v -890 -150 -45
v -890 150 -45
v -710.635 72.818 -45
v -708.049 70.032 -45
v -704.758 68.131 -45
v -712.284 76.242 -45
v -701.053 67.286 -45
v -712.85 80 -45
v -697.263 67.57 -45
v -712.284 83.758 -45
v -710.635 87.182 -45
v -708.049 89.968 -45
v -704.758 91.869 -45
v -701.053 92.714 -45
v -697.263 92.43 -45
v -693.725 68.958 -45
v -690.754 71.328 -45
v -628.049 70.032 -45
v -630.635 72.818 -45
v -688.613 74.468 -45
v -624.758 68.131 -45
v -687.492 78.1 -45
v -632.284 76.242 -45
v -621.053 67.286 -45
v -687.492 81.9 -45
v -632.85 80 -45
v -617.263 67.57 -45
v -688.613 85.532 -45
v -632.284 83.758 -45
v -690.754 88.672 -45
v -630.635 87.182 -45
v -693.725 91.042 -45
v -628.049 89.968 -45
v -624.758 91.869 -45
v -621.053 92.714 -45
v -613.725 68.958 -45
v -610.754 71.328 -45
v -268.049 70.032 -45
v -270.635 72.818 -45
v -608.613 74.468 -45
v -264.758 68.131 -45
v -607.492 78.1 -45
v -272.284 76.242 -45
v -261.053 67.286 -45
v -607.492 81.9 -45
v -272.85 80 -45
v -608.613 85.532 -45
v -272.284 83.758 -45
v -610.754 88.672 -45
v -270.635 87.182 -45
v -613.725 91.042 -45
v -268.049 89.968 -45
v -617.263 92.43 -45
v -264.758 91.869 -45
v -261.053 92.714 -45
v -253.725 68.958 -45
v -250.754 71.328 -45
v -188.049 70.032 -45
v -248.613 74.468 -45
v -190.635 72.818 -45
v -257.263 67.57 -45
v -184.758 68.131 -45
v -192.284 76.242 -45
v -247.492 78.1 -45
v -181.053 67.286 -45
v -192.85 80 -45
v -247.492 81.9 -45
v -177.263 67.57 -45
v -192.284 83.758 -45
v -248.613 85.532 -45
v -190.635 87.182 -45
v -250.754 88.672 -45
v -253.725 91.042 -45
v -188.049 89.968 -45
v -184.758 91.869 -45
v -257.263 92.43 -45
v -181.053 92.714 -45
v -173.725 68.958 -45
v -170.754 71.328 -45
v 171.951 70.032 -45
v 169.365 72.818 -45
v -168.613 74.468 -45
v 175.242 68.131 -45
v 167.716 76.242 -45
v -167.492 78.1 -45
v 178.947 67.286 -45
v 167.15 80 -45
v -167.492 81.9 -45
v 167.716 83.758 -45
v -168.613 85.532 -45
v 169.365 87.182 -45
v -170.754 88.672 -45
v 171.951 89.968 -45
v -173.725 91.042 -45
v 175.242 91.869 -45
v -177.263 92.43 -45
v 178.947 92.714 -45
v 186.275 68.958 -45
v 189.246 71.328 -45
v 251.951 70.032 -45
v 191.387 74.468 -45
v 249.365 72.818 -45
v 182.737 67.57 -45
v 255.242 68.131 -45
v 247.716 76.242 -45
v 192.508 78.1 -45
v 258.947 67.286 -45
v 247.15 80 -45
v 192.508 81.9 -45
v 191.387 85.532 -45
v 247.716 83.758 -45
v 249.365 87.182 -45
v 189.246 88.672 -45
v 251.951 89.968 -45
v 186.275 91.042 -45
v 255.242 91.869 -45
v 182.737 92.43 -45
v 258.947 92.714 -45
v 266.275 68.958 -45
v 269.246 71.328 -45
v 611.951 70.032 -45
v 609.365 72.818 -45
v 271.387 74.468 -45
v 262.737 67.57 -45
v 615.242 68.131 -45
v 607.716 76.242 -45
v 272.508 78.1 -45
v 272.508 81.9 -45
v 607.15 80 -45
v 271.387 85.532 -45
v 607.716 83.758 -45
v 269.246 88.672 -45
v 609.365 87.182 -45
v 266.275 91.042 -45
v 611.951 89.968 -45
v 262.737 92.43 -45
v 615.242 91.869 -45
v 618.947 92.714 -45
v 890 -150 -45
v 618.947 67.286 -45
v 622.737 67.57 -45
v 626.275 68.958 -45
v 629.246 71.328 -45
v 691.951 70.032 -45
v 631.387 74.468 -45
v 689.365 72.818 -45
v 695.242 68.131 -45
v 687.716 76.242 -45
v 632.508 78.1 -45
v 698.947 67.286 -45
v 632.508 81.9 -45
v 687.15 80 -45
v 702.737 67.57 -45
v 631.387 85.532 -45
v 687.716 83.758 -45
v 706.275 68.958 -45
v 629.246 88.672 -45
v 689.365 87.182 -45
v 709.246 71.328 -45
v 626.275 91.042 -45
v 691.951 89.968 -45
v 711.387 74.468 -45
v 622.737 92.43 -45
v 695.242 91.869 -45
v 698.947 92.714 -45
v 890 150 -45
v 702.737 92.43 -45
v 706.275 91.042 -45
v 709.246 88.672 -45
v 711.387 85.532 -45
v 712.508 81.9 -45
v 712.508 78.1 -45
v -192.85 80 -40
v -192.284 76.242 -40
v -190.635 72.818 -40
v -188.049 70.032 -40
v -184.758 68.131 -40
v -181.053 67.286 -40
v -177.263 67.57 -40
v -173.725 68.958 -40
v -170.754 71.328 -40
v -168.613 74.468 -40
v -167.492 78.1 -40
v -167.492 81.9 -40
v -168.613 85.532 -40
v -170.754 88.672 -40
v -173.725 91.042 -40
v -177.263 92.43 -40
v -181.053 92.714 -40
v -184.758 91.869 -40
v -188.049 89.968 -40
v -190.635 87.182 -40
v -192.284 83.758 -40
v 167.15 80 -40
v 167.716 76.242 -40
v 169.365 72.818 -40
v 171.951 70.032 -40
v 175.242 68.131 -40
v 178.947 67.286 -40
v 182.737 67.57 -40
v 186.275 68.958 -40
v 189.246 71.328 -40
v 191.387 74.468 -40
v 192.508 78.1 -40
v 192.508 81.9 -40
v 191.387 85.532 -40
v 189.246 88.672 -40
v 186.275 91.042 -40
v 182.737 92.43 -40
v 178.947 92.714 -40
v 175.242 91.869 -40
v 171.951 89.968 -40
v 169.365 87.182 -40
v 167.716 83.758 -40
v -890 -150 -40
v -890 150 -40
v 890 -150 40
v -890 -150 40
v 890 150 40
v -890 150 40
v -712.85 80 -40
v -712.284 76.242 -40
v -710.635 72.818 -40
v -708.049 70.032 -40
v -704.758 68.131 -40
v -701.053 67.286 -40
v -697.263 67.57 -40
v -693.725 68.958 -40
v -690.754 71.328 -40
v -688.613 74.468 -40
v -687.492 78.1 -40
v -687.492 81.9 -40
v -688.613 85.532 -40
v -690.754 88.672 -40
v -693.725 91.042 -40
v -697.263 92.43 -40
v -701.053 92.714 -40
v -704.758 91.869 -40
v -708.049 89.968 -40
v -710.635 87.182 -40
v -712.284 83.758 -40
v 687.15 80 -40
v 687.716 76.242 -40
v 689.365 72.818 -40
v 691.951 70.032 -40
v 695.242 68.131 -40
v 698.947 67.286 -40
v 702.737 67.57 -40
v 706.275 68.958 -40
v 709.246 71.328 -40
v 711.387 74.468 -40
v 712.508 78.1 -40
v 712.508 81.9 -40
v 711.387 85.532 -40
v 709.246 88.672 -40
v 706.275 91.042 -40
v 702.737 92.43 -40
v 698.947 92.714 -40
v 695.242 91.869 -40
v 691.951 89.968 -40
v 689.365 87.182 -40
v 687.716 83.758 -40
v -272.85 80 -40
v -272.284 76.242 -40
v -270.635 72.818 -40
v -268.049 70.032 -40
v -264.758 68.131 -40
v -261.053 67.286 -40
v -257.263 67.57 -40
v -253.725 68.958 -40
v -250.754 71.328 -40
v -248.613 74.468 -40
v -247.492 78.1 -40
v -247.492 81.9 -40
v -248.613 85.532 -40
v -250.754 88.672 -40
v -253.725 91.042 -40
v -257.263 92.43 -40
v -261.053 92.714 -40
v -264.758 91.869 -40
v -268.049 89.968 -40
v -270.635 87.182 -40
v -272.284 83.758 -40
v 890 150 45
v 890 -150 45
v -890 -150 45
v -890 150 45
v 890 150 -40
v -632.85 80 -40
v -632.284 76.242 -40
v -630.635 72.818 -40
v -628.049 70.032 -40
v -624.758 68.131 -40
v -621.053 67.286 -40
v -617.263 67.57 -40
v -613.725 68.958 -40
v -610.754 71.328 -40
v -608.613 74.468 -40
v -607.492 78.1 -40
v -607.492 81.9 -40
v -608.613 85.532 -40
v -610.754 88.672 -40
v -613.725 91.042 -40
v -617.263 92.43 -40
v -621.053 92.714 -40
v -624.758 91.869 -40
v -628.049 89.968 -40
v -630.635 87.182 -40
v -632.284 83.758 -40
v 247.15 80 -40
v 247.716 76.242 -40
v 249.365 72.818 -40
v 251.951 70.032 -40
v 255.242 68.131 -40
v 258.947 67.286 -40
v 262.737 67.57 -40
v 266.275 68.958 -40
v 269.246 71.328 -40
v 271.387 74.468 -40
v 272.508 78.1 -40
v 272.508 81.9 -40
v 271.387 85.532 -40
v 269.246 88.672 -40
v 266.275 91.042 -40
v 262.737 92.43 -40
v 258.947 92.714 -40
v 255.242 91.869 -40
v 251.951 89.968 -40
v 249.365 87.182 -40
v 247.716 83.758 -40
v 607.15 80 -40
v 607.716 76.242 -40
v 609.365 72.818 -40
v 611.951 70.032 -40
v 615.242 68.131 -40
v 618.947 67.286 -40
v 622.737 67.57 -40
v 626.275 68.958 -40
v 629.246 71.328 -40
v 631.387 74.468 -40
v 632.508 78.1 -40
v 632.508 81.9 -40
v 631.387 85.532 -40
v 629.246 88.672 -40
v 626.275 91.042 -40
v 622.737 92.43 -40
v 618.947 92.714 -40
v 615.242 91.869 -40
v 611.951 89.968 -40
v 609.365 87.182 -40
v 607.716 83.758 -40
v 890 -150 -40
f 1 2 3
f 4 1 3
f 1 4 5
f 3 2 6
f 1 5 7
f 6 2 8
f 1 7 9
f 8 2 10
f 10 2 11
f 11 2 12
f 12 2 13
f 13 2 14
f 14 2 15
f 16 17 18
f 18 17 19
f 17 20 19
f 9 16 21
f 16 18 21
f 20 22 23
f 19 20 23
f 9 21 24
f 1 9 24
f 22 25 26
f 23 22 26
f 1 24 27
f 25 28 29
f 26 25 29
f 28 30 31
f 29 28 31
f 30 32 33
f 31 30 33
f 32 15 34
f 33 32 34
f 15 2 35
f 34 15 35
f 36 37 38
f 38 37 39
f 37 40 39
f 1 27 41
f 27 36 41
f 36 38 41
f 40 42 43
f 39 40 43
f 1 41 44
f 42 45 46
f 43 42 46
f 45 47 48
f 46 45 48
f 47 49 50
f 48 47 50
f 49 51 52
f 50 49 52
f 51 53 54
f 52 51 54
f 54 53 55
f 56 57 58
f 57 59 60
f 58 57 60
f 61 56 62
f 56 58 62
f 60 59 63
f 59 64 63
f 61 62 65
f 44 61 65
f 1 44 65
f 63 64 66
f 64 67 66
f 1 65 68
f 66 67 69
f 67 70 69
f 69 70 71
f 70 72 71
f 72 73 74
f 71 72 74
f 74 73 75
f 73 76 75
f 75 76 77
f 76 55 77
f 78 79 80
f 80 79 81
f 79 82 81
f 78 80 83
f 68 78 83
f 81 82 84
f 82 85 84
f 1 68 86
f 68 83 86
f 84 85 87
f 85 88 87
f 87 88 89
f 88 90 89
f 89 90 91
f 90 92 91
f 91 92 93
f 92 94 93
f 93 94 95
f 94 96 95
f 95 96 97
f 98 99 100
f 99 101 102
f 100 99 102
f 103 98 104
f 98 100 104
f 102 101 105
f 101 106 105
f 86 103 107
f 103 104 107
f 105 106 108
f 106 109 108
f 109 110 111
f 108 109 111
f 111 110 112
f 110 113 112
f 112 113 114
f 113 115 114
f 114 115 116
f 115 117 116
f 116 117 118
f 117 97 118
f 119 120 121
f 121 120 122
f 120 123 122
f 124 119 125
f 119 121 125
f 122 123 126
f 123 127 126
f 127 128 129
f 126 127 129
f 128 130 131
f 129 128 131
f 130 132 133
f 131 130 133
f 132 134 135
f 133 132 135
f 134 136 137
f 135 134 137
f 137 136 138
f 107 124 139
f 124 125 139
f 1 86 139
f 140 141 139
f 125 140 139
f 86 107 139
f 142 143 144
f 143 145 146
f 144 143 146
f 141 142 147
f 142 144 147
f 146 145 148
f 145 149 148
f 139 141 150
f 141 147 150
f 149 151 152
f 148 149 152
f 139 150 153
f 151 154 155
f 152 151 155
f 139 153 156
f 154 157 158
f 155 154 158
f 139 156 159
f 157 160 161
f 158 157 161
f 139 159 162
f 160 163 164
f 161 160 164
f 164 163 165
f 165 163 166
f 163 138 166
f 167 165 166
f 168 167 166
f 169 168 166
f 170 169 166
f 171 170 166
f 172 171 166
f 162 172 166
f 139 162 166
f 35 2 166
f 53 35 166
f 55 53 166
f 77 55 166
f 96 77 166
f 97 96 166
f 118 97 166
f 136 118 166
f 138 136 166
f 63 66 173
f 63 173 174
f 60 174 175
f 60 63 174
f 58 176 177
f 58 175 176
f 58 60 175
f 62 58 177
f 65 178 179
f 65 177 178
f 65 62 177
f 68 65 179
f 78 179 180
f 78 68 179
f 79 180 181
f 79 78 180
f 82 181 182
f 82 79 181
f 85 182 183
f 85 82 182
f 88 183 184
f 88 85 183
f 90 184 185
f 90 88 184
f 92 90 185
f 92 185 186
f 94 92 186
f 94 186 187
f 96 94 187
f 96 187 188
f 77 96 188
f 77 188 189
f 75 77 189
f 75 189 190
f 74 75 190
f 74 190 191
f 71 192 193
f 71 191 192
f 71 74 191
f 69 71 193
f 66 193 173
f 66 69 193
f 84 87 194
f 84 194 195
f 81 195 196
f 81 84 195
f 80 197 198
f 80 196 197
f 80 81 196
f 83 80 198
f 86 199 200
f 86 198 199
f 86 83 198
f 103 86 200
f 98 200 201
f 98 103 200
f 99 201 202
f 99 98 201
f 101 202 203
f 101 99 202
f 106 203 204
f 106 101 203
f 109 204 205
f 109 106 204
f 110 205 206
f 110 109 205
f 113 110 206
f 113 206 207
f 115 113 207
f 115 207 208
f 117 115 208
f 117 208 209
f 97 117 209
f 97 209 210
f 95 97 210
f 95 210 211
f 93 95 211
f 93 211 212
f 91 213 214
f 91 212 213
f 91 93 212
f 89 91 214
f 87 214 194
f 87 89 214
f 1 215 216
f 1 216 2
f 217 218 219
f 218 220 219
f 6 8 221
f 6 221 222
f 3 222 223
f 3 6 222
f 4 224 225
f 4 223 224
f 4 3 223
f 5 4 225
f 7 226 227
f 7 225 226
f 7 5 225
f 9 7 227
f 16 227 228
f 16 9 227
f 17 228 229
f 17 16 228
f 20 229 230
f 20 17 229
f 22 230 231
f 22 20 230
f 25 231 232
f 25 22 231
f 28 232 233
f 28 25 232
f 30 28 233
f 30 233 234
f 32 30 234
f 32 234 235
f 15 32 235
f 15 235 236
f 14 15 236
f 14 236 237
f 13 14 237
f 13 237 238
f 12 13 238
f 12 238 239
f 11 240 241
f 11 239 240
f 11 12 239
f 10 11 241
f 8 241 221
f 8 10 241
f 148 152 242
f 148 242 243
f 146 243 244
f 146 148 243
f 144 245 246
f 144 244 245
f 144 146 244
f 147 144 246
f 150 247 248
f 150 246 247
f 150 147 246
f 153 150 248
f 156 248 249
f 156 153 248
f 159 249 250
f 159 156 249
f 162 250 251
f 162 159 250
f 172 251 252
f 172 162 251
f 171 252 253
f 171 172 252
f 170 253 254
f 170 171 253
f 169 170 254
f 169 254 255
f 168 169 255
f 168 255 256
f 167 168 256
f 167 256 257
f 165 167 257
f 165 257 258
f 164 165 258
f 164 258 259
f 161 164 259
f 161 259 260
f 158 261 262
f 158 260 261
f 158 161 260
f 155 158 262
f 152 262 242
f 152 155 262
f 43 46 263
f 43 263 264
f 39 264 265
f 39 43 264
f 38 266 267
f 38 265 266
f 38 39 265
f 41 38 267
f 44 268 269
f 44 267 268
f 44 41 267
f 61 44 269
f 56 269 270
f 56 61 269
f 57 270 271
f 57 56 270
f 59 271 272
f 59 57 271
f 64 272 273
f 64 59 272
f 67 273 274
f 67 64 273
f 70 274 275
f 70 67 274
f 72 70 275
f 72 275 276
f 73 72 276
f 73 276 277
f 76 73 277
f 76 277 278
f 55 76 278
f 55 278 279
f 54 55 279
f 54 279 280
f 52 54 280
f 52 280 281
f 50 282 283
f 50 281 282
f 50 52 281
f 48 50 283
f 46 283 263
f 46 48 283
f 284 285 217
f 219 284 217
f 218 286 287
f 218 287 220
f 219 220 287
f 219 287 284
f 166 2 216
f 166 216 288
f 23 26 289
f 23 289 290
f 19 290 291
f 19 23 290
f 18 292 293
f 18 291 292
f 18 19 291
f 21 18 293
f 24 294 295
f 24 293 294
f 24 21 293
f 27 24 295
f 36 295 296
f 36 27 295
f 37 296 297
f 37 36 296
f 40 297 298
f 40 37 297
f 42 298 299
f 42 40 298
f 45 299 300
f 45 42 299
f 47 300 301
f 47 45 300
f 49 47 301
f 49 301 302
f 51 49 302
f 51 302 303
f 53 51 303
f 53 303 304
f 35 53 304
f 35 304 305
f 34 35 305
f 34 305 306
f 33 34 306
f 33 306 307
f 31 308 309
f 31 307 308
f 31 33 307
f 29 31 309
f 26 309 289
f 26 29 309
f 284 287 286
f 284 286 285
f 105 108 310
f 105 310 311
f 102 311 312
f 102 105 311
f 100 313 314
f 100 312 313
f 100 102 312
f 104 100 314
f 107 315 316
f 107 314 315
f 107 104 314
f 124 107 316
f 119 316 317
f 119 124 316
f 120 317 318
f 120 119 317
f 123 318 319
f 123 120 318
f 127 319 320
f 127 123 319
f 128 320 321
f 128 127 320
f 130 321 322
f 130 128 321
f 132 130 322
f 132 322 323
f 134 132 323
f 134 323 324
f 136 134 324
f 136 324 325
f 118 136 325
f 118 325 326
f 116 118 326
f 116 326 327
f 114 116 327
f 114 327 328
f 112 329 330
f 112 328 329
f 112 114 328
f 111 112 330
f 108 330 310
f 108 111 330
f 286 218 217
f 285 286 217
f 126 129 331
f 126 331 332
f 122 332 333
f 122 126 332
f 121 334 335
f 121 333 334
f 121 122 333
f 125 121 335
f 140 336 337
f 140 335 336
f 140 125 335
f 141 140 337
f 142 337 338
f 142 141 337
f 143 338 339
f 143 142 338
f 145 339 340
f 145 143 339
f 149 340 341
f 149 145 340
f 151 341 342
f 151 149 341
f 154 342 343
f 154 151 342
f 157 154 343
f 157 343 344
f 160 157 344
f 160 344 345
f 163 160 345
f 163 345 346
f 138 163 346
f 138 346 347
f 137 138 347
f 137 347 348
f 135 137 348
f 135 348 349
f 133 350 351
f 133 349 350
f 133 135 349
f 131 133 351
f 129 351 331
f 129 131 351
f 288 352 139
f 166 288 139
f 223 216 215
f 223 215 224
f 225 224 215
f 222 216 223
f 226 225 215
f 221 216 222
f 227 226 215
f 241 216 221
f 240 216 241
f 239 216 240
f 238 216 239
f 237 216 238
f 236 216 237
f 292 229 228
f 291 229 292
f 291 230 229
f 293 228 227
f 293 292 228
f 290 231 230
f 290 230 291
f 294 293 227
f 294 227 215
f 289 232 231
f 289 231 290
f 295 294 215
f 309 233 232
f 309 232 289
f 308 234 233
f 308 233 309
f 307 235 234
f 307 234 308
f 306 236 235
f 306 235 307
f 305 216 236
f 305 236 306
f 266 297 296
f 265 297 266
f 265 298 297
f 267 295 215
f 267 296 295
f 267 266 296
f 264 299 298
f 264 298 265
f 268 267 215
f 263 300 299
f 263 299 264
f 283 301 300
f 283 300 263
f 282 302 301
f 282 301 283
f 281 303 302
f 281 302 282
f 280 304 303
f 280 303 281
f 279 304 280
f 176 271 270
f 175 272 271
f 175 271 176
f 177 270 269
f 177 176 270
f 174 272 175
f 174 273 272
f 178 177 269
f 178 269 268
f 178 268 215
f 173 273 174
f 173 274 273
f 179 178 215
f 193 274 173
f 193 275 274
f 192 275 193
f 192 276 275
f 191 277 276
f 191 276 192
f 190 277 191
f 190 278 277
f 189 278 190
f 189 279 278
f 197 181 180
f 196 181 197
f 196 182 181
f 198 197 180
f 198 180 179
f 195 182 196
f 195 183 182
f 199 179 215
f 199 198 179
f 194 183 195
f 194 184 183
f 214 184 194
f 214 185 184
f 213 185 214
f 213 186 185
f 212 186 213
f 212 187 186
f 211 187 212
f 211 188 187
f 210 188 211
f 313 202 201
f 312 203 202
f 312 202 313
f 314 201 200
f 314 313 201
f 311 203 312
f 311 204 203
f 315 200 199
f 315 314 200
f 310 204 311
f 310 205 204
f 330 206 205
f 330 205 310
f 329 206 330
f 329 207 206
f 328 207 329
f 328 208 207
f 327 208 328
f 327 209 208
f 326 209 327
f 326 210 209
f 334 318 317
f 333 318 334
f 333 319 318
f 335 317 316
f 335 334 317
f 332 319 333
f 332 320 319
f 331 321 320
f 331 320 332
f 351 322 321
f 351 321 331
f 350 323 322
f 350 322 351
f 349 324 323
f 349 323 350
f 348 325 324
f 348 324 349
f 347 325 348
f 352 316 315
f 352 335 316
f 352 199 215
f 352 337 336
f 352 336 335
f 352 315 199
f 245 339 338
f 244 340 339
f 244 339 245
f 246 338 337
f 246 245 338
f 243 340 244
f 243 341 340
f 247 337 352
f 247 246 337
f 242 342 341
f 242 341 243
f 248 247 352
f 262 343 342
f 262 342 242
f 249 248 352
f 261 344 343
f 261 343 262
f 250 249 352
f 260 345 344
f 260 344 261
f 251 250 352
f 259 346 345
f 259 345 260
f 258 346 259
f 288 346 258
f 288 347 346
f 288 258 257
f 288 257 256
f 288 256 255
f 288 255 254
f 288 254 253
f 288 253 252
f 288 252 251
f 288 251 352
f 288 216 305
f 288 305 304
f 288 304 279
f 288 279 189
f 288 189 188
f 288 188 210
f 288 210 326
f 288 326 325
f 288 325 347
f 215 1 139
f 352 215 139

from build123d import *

# Parameters (mm, degrees)
SKETCH1_W               = 1780
SKETCH1_H               = 5
BOSS_EXTRUDE1_DEPTH     = 150
BOSS_EXTRUDE1_2_DEPTH   = 150
CUT_EXTRUDE1_DEPTH      = 39
CUT_EXTRUDE1_DEPTH_BACK = 33
CUT_EXTRUDE1_START      = -85
SKETCH2_R               = 12.75


with BuildPart() as part:
    # Sketch1 → Boss-Extrude1 (new, symmetric)
    with BuildSketch(Plane(origin=(0, 0, 0), x_dir=(1, 0, 0), z_dir=(0, 1, 0))):
        with Locations((0, 42.5)):
            Rectangle(SKETCH1_W, SKETCH1_H)
    extrude(amount=BOSS_EXTRUDE1_DEPTH, both=True)

    # Sketch2 → Cut-Extrude1 (cut, two sides: drawn at the far end of the back side and taken through both)
    with BuildSketch(Plane.XY.offset(45).offset(CUT_EXTRUDE1_START - CUT_EXTRUDE1_DEPTH_BACK)):
        with Locations(Location((-700.1, 80, 0), (0, 0, 180))):
            Circle(SKETCH2_R)
        with Locations(Location((-620.1, 80, 0), (0, 0, 180))):
            Circle(SKETCH2_R)
        with Locations(Location((-260.1, 80, 0), (0, 0, 180))):
            Circle(SKETCH2_R)
        with Locations(Location((-180.1, 80, 0), (0, 0, 180))):
            Circle(SKETCH2_R)
        with Locations(Location((179.9, 80, 0), (0, 0, 180))):
            Circle(SKETCH2_R)
        with Locations(Location((259.9, 80, 0), (0, 0, 180))):
            Circle(SKETCH2_R)
        with Locations(Location((619.9, 80, 0), (0, 0, 180))):
            Circle(SKETCH2_R)
        with Locations(Location((699.9, 80, 0), (0, 0, 180))):
            Circle(SKETCH2_R)
    extrude(amount=CUT_EXTRUDE1_DEPTH + CUT_EXTRUDE1_DEPTH_BACK, mode=Mode.SUBTRACT)


with BuildPart() as body_2:
    # Sketch1 → Boss-Extrude1 2 (new, symmetric)
    with BuildSketch(Plane(origin=(0, 0, 0), x_dir=(1, 0, 0), z_dir=(0, 1, 0))):
        with Locations((0, -42.5)):
            Rectangle(SKETCH1_W, SKETCH1_H)
    extrude(amount=BOSS_EXTRUDE1_2_DEPTH, both=True)


solid = Compound([part.part, body_2.part])
